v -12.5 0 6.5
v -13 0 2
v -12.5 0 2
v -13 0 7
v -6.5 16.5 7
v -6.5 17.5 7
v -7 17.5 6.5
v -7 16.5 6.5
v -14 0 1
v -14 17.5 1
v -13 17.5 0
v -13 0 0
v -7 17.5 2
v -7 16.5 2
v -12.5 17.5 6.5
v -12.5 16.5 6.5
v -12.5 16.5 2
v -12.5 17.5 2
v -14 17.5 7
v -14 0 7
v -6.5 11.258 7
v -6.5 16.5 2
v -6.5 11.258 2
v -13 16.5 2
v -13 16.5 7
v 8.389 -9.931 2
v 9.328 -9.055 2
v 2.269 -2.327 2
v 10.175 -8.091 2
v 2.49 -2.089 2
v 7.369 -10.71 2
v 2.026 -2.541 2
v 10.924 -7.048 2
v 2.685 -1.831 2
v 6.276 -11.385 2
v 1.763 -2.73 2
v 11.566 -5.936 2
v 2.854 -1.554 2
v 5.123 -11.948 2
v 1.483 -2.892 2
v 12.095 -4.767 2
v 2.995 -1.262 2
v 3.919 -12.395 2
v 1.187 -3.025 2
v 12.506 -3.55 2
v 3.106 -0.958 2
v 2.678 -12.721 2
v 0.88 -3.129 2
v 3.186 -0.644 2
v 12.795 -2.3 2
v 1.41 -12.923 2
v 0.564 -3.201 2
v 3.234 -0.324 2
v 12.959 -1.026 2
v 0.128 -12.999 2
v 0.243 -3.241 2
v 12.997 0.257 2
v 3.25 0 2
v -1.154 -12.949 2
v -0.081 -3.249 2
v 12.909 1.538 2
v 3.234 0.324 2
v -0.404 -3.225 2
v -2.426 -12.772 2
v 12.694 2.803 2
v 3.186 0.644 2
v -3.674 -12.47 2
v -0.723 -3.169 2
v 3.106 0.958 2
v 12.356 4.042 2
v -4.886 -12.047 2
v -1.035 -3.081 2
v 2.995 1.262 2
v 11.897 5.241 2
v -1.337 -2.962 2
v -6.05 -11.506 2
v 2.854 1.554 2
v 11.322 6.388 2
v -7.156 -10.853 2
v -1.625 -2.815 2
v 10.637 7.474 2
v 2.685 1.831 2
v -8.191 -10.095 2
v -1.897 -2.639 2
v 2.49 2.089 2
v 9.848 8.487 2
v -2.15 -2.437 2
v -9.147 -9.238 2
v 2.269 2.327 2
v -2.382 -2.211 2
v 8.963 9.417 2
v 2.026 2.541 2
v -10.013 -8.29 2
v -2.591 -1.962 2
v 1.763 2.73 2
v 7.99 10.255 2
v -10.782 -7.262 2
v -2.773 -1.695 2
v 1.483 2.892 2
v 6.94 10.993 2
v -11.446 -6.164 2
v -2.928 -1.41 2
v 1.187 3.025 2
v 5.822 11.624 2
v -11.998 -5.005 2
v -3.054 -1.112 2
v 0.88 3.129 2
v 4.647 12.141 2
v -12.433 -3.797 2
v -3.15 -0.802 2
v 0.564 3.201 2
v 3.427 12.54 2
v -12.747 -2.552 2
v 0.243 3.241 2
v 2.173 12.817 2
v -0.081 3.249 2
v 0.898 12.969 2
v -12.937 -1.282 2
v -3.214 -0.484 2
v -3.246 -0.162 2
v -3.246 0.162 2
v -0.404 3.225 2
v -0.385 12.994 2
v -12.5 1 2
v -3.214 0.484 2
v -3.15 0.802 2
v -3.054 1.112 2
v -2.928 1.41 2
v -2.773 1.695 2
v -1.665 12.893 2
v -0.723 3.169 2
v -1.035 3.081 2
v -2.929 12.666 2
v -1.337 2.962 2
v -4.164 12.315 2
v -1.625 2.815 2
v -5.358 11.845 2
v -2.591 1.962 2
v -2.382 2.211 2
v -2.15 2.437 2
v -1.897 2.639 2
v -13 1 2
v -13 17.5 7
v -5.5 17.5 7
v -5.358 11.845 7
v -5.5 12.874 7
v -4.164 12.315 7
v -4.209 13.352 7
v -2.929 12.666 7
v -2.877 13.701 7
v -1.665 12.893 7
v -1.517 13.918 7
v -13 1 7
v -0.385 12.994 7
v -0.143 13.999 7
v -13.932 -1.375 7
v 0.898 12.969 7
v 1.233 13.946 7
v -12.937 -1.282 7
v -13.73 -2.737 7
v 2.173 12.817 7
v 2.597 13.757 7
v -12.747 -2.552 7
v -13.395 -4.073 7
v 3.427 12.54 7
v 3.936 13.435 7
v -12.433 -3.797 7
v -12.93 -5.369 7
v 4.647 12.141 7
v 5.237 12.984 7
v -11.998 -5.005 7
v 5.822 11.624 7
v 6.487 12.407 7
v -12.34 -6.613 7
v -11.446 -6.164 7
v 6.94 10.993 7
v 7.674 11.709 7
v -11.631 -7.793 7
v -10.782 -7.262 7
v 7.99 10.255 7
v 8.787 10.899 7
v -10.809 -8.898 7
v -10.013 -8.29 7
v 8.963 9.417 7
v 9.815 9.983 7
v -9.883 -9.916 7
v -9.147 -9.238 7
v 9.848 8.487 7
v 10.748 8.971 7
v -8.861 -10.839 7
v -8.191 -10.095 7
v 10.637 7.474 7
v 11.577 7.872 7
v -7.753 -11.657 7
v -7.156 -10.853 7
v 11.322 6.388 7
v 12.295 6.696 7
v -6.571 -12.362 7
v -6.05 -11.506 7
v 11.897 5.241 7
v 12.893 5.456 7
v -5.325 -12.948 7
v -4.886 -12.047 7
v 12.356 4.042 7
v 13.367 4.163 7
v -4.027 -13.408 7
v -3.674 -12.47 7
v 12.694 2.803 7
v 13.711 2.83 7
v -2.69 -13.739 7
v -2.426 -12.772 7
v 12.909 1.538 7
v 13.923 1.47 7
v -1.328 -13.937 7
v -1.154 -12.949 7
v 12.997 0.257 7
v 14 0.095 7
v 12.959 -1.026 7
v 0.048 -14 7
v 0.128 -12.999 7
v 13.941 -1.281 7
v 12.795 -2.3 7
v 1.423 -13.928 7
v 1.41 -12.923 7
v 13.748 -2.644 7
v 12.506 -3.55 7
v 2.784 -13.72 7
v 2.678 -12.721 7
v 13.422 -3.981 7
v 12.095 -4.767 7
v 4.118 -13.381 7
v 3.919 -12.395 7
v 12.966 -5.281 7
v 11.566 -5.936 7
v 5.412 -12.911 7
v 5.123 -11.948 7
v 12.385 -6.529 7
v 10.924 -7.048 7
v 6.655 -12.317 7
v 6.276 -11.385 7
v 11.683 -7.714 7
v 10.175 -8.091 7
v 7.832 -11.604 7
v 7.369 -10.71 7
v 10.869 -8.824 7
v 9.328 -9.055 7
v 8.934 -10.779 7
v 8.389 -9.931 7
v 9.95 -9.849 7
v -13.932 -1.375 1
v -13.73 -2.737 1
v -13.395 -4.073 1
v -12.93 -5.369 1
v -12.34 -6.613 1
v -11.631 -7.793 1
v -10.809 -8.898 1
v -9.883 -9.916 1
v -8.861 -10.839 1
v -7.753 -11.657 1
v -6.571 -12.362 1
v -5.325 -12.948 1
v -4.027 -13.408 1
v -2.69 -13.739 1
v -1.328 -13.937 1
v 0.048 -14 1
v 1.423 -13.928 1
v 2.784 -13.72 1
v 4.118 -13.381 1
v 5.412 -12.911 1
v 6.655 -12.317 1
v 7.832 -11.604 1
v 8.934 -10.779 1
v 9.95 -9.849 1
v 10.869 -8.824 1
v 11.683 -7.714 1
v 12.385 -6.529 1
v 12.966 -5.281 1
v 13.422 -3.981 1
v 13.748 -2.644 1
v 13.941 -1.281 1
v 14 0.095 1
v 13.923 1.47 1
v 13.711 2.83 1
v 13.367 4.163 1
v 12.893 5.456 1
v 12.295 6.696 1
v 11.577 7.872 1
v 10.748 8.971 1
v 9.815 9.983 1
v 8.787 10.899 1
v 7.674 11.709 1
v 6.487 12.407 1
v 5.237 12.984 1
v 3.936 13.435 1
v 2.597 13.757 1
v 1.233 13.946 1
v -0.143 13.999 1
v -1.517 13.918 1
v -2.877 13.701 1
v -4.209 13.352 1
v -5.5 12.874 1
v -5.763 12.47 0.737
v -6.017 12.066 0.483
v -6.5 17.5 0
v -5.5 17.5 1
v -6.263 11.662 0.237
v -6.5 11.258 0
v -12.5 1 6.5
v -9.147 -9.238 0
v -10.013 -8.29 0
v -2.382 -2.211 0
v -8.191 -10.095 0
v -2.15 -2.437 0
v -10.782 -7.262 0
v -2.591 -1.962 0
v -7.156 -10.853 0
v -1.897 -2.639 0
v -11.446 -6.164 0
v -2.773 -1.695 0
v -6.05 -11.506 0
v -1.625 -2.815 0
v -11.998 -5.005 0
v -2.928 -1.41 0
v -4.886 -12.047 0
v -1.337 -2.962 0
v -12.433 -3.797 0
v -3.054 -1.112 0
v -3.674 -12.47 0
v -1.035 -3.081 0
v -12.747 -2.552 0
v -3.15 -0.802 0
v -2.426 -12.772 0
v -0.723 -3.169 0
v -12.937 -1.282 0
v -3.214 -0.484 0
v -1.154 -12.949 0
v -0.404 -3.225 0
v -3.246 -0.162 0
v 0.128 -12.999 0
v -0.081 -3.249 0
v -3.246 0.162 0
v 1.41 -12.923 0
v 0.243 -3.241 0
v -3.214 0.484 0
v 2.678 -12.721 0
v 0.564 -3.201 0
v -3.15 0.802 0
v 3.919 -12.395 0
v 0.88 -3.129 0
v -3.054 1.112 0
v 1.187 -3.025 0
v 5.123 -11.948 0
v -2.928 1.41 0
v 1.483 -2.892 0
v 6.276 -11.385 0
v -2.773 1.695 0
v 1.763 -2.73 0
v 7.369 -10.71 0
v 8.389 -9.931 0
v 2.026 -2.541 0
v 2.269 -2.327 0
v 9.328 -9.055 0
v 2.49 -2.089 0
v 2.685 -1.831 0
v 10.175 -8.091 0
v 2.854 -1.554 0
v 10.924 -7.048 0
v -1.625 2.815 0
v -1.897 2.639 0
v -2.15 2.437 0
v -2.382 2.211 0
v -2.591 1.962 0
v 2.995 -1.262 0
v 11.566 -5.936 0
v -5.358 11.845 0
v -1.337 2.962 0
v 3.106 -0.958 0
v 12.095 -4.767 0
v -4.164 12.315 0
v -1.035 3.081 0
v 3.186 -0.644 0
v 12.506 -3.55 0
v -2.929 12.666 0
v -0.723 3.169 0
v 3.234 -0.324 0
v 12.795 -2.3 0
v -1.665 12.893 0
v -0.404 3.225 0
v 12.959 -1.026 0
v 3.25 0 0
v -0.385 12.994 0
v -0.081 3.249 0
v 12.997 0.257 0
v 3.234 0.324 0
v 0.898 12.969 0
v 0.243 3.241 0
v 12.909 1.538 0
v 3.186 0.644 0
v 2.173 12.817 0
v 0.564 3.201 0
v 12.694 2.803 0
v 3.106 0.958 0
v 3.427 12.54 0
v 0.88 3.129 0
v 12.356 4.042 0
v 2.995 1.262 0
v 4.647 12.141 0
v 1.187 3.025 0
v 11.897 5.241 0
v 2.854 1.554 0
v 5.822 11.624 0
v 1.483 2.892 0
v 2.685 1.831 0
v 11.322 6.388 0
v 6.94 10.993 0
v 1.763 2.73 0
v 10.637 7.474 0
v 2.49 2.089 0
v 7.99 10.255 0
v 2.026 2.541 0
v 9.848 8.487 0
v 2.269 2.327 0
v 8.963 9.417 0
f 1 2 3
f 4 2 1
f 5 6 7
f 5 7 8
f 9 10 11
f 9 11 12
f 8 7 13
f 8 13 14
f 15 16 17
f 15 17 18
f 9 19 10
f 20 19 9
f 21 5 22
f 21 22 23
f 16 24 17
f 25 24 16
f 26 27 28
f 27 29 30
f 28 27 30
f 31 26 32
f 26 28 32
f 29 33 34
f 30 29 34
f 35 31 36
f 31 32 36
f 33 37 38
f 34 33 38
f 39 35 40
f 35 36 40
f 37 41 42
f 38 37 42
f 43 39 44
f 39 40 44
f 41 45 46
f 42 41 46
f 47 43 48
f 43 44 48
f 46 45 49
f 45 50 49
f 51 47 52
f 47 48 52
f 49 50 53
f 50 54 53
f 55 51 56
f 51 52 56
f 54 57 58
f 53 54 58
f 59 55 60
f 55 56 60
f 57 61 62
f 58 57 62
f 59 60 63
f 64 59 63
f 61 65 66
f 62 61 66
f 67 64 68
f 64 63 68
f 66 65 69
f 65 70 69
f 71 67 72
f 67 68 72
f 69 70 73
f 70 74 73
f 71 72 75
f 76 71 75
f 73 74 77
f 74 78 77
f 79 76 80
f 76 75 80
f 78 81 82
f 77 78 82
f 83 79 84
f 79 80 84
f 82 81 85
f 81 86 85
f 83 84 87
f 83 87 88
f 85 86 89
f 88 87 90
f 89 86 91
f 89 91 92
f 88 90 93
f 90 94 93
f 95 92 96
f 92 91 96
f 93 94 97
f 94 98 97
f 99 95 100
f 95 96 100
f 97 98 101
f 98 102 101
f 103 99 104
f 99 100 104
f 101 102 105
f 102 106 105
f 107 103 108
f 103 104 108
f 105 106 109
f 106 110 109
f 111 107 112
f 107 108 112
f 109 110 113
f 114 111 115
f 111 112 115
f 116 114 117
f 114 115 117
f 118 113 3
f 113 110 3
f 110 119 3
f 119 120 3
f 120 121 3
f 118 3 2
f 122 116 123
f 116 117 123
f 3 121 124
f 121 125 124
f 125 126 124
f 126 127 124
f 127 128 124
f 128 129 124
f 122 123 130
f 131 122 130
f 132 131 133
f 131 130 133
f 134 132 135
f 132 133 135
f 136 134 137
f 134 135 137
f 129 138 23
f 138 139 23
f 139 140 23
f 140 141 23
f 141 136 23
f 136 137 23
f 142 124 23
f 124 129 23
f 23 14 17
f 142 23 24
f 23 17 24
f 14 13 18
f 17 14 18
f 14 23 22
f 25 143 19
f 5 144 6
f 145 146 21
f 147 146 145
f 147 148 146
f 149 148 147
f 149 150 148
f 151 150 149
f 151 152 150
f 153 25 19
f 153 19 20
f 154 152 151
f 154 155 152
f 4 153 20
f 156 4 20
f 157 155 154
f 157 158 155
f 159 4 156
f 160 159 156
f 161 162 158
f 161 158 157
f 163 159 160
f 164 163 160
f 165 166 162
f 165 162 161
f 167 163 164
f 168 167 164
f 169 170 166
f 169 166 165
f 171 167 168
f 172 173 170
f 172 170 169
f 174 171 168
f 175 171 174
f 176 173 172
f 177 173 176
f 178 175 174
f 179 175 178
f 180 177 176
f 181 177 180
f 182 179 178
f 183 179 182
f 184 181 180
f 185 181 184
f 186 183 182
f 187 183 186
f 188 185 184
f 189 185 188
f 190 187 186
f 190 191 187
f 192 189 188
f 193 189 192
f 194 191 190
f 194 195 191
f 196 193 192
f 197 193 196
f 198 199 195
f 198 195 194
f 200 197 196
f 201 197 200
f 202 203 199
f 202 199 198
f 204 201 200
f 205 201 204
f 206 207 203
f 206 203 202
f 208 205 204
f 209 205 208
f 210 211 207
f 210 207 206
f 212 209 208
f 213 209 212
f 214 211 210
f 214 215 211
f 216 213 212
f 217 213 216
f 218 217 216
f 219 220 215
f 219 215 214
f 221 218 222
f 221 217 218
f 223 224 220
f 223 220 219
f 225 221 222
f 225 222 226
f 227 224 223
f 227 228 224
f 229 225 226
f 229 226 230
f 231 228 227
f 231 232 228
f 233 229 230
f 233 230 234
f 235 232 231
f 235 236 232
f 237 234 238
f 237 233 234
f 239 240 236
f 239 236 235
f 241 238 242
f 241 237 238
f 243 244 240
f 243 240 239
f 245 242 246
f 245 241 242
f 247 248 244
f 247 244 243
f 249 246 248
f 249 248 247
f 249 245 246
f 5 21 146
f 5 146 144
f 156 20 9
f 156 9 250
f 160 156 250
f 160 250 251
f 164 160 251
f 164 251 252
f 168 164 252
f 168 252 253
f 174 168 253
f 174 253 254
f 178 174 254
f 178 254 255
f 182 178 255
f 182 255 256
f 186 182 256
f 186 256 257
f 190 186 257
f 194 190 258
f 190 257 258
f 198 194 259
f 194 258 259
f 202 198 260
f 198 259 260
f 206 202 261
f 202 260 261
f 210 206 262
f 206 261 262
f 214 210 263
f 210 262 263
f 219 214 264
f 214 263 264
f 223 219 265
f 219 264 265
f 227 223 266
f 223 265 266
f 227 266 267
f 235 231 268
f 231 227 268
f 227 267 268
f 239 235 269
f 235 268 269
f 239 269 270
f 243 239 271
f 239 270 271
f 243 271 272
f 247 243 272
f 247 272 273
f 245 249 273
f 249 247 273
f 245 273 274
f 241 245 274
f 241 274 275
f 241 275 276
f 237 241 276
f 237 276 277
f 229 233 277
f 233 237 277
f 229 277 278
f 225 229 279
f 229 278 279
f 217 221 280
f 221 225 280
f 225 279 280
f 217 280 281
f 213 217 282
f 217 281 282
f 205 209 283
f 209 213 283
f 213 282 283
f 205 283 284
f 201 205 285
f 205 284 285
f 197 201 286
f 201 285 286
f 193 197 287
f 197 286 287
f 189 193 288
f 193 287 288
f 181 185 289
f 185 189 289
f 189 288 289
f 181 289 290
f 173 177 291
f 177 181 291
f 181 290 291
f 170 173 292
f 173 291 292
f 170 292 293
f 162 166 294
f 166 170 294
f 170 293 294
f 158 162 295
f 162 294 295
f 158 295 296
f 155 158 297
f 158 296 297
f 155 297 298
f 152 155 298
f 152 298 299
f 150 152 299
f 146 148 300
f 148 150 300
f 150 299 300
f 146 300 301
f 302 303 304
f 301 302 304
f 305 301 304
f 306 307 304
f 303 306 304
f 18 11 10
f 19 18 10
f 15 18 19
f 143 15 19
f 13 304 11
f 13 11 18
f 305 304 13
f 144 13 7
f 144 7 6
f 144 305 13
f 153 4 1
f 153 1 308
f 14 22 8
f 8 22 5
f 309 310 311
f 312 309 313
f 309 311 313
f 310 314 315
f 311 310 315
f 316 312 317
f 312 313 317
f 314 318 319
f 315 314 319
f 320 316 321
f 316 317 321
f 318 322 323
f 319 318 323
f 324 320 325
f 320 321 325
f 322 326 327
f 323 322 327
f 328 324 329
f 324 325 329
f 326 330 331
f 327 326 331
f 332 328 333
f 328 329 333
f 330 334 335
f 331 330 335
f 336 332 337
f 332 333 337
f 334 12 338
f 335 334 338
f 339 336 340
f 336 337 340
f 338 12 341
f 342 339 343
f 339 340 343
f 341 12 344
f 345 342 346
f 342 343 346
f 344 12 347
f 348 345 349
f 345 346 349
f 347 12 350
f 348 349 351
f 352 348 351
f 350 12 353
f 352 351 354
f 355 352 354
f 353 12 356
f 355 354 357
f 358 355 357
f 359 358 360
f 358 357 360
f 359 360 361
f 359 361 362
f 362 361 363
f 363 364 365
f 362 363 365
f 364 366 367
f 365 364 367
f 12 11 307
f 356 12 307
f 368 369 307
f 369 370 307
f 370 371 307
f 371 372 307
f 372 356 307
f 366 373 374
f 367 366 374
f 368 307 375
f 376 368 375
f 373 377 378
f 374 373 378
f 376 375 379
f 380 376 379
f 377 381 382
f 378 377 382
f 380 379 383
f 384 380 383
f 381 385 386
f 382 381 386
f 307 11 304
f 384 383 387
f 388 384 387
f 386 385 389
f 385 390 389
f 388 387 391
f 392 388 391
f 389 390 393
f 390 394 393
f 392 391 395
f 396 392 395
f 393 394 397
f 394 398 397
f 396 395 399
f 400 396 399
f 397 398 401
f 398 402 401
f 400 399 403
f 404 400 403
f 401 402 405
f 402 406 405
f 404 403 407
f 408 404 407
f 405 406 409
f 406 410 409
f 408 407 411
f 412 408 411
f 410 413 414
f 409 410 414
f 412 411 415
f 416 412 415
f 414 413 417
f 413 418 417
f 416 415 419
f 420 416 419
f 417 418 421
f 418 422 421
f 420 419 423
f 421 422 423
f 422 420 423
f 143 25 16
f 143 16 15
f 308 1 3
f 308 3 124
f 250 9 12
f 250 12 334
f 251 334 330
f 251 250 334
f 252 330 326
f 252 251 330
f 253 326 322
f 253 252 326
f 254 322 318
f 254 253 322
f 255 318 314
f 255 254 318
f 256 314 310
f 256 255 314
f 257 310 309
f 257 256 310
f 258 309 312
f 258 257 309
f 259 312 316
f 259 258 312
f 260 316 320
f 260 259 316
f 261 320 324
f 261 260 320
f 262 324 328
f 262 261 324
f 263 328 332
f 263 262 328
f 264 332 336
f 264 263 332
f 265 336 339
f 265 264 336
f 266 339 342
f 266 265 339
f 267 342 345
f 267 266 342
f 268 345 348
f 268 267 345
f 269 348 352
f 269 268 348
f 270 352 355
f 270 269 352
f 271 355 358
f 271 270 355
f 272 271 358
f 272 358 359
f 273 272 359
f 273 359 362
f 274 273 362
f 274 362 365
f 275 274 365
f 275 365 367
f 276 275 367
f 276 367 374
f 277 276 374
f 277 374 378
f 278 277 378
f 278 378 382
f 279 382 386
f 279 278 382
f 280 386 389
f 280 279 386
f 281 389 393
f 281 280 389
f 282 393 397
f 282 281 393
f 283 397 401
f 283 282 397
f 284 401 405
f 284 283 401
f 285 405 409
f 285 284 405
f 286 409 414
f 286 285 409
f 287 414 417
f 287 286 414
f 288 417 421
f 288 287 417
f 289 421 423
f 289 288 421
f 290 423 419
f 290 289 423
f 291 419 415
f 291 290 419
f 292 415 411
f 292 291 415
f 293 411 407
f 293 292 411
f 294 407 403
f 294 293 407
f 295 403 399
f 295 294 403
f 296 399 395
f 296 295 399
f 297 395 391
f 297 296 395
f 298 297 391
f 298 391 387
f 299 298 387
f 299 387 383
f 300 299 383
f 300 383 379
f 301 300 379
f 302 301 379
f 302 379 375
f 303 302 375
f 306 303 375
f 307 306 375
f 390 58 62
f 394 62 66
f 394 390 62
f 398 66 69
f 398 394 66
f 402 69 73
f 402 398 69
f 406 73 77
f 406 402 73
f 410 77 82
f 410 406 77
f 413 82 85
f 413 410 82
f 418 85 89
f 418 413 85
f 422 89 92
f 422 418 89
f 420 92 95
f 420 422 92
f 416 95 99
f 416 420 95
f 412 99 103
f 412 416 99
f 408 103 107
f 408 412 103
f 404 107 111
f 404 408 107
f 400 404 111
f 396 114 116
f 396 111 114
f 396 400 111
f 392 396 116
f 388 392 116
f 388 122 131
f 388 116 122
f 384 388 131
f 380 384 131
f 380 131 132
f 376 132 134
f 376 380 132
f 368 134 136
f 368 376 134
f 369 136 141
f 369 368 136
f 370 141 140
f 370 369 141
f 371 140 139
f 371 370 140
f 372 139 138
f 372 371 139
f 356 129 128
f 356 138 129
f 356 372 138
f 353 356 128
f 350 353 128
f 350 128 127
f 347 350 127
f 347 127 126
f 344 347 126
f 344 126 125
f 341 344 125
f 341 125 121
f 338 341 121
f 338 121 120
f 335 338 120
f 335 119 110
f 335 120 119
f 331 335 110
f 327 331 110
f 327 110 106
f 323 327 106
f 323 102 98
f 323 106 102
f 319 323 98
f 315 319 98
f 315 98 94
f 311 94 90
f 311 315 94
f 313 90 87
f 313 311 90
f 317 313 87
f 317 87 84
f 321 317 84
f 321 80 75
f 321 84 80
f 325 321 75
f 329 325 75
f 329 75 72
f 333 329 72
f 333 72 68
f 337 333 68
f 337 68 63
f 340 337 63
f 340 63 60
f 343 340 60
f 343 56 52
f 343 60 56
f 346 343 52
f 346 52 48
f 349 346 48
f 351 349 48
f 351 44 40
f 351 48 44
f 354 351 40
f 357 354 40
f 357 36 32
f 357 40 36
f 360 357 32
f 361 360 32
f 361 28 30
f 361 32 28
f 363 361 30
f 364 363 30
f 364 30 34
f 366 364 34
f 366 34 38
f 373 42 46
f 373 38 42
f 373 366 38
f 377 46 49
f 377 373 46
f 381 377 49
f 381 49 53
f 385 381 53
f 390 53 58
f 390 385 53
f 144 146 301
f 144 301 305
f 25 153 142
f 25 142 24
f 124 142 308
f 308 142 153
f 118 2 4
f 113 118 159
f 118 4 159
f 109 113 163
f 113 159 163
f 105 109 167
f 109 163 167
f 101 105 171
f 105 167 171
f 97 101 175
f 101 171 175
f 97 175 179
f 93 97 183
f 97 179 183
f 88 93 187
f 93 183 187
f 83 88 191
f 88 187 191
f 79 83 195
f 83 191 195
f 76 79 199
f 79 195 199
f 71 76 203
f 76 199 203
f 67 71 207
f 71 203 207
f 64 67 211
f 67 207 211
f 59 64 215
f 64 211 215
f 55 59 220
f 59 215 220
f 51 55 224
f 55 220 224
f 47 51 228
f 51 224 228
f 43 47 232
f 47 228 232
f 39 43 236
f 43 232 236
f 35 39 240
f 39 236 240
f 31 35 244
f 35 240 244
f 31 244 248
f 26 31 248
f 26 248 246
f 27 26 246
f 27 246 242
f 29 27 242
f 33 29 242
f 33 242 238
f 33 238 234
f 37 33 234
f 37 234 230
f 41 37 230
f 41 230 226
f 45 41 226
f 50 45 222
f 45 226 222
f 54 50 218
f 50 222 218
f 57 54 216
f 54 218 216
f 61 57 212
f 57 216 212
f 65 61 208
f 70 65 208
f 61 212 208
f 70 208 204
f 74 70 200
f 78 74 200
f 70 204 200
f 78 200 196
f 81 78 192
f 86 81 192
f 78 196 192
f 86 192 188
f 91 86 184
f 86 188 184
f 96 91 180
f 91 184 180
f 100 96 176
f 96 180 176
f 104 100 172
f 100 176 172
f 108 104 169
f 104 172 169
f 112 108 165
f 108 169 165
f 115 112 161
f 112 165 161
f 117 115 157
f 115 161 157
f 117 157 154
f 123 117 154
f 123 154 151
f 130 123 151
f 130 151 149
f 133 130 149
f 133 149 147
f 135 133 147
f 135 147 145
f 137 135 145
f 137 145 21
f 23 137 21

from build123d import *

# Parameters (mm, degrees)
F0_R      = 14
F0_R_2    = 3.25
F1_DEPTH  = 7
F2_R      = 13
F3_DEPTH  = 5
F5_DEPTH  = 7
F6_W      = 8.5
F6_H      = 2
F7_DEPTH  = 12.8
F8_W      = 6.5
F8_H      = 5
F9_DEPTH  = 17.5
F10_W     = 1
F10_H     = 5
F11_DEPTH = 0.5
F12_W     = 1
F12_H     = 5
F13_DEPTH = 0.5
F14_SIZE  = 0.49999
F15_SIZE  = 1


# Not quite as in the source:
# - a fillet or chamfer is up to 0.001 mm smaller than in the source, because OpenCascade refuses the exact size


with BuildPart() as f1:
    # F0 (on Top) → F1 (new body)
    with BuildSketch(Plane.XY):
        Circle(F0_R)
        Circle(F0_R_2, mode=Mode.SUBTRACT)
    extrude(amount=F1_DEPTH)

    # F2 (on face) → F3 (cut)
    with BuildSketch(Plane.XY.offset(7)):
        Circle(F2_R)
    extrude(amount=-F3_DEPTH, mode=Mode.SUBTRACT)

    # F4 (on face) → F5 (join)
    with BuildSketch(Plane.XY.offset(7)):
        with BuildLine():
            Line((-14, 17.5), (-14, 0))
            ThreePointArc((-14, 0), (-13.7477270849, 2.6457513111), (-13, 5.1961524227))
            Line((-13, 5.1961524227), (-13, 17.5))
            Line((-13, 17.5), (-14, 17.5))
        make_face()
        with BuildLine():
            ThreePointArc((-6.5, 12.3995967676), (-6.0046946559, 12.6468827024), (-5.5, 12.8743931896))
            Line((-5.5, 12.8743931896), (-5.5, 17.5))
            Line((-5.5, 17.5), (-6.5, 17.5))
            Line((-6.5, 17.5), (-6.5, 12.3995967676))
        make_face()
    extrude(amount=-F5_DEPTH)

    # F6 (on face) → F7 (join)
    with BuildSketch(Plane(origin=(0, 17.5, 0), x_dir=(-1, 0, 0), z_dir=(0, 1, 0))):
        with Locations((9.75, 1)):
            Rectangle(F6_W, F6_H)
    extrude(amount=-F7_DEPTH)

    # F8 (on face) → F9 (cut)
    with BuildSketch(Plane(origin=(0, 17.5, 0), x_dir=(-1, 0, 0), z_dir=(0, 1, 0))):
        with Locations((9.75, 4.5)):
            Rectangle(F8_W, F8_H)
    extrude(amount=-F9_DEPTH, mode=Mode.SUBTRACT)

    # F10 (on face) → F11 (join)
    with BuildSketch(Plane.YZ.offset(-13)):
        with Locations((0.5, 4.5)):
            Rectangle(F10_W, F10_H)
        with Locations((17, 4.5)):
            Rectangle(F10_W, F10_H)
    extrude(amount=F11_DEPTH)

    # F12 (on face) → F13 (join)
    with BuildSketch(Plane(origin=(-6.5, 0, 0), x_dir=(0, -1, 0), z_dir=(-1, 0, 0))):
        with Locations((-17, 4.5)):
            Rectangle(F12_W, F12_H)
    extrude(amount=F13_DEPTH)

    # F14 (size 0.5 in the source; OpenCascade refuses exactly that, so slightly less here)
    f14_edges = [f1.edges().sort_by_distance(p)[0] for p in [
        (-12.5, 0.5, 7),
        (-12.5, 17, 7),
        (-7, 17, 7),
    ]]
    chamfer(f14_edges, length=F14_SIZE)

    # F15
    f15_edges = [f1.edges().sort_by_distance(p)[0] for p in [
        (11.683321, -7.713624, 0),
        (-5.5, 15.187197, 0),
        (-14, 8.75, 0),
    ]]
    chamfer(f15_edges, length=F15_SIZE)


solid = f1.part
